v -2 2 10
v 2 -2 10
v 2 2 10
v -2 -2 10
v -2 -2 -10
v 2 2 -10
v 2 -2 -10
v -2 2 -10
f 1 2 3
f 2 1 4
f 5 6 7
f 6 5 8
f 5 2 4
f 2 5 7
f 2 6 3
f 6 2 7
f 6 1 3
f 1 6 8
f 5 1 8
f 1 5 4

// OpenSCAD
import("../../3mf/far-out-ring.3mf", center=true);
// reference for origin
cube([4,4,20], center = true);
